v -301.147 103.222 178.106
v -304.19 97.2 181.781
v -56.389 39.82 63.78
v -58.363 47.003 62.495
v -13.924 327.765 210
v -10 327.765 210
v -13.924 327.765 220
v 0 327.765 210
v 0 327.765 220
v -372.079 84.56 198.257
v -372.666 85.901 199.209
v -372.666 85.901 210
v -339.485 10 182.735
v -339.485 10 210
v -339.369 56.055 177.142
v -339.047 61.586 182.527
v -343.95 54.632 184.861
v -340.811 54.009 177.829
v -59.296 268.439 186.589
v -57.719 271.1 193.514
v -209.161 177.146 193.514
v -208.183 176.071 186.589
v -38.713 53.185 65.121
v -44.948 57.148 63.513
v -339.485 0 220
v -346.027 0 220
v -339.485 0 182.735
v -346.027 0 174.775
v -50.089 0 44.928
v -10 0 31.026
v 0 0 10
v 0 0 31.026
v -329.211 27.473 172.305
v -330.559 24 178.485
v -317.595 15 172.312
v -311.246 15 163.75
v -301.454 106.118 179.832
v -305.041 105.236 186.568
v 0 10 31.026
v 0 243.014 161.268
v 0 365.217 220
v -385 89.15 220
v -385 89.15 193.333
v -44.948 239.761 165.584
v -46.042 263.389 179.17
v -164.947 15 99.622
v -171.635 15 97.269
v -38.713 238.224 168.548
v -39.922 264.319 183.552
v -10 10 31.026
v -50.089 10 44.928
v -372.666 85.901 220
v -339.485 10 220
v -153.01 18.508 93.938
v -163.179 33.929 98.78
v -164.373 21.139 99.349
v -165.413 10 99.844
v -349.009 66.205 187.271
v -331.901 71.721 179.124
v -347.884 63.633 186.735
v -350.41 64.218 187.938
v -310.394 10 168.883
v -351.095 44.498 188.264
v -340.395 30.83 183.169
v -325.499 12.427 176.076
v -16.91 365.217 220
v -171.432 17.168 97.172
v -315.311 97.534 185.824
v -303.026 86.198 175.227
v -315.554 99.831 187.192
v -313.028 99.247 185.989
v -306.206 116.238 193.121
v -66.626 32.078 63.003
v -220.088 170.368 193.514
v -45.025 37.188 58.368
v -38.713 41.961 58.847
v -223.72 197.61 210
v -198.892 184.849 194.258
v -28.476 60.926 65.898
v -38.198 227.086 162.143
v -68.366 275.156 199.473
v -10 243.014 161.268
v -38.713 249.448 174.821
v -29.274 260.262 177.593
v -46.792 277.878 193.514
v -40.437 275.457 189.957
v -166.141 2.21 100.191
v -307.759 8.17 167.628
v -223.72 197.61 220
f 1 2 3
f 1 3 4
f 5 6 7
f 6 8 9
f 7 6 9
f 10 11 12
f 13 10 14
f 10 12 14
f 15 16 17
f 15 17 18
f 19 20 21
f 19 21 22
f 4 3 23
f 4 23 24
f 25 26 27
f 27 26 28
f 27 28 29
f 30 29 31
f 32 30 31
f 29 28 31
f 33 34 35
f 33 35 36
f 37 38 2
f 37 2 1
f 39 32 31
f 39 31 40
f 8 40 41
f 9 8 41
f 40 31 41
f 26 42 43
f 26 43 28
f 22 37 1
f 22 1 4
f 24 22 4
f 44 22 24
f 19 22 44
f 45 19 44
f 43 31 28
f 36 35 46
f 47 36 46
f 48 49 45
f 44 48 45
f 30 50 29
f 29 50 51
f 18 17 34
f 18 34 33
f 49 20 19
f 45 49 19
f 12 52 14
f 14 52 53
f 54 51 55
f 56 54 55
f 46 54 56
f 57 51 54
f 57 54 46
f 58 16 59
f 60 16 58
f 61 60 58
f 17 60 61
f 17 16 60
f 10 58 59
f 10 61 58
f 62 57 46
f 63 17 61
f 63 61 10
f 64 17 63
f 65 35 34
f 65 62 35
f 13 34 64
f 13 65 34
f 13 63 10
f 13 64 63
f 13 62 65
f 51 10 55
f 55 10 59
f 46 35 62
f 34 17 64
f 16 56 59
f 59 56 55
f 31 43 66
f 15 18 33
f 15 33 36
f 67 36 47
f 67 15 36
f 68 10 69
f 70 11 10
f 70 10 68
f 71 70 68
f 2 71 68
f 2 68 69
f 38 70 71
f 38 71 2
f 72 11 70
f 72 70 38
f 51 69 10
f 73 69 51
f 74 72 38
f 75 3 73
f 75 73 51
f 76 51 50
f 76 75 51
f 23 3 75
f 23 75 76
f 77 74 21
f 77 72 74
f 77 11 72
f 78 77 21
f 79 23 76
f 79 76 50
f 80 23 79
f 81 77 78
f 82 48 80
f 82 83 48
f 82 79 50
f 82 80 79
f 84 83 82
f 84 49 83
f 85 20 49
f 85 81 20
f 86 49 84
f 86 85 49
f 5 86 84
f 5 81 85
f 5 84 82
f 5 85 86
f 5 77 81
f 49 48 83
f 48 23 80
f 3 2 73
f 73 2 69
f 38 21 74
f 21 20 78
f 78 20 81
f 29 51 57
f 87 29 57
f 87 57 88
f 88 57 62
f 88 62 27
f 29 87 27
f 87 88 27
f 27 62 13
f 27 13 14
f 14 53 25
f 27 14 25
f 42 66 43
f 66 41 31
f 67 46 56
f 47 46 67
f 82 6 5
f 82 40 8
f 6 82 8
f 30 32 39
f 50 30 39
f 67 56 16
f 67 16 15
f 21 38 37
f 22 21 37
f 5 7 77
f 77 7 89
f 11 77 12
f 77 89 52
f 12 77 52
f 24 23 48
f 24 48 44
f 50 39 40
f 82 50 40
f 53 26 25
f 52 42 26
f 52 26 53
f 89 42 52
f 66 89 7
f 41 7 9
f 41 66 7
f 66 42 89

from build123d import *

# Parameters (mm, degrees)
BOSS_EXTRU_1_DEPTH       = 220
ENL_V_MAT_EXTRU_1_DEPTH  = 593.628391152
ENL_V_MAT_EXTRU_7_DEPTH  = 585.622735541
ENL_V_MAT_EXTRU_8_DEPTH  = 581.933509888
ENL_V_MAT_EXTRU_9_DEPTH  = 576.952076714
COQUE2_T                 = 10
ENL_V_MAT_EXTRU_10_DEPTH = 10
ENL_V_MAT_EXTRU_11_DEPTH = 10
ENL_V_MAT_EXTRU_12_DEPTH = 10
ENL_V_MAT_EXTRU_13_DEPTH = 5
ENL_V_MAT_EXTRU_14_DEPTH = 5
CHANFREIN1_SIZE          = 5


with BuildPart() as part:
    # Esquisse1 → Boss.-Extru.1 (new body)
    with BuildSketch(Plane.XY):
        Polygon((0, 0), (0, 300), (0, 377.9), (-400, 77.9), (-400, 0), align=None)
    extrude(amount=BOSS_EXTRU_1_DEPTH)

    # Esquisse2 → Enlèv. mat.-Extru.1 (cut, through all)
    with BuildSketch(Plane(origin=(0, 0, 0), x_dir=(0, 0, -1), z_dir=(1, 0, 0))):
        Polygon((-240, 400), (-10, 0), (0, 0), (0, 377.9), (0, 400), align=None)
    extrude(amount=-ENL_V_MAT_EXTRU_1_DEPTH, mode=Mode.SUBTRACT)

    # Esquisse9 → Enlèv. mat.-Extru.7 (cut, through all)
    with BuildSketch(Plane(origin=(0, 0, 0), x_dir=(-1, 0, 0), z_dir=(0, -1, 0))):
        Polygon((0, -10), (546, -270), (546, -10), align=None)
    extrude(amount=-ENL_V_MAT_EXTRU_7_DEPTH, mode=Mode.SUBTRACT)

    # Esquisse10 → Enlèv. mat.-Extru.8 (cut, through all)
    with BuildSketch(Plane.XY.offset(220)):
        Polygon((-400, 77.9), (-385, 89.15), (15, -825.85), (-400, -825.85), align=None)
    extrude(amount=-ENL_V_MAT_EXTRU_8_DEPTH, mode=Mode.SUBTRACT)

    # Esquisse11 → Enlèv. mat.-Extru.9 (cut, through all)
    with BuildSketch(Plane(origin=(2.420403375, -3.901436921, 6.980009459), x_dir=(-0.957115229324862, -0.14134879209424664, 0.25288526403868283), z_dir=(-0.2897075038628045, 0.46697817542256076, -0.8354645090514613))):
        Polygon((411.522876563, 185.157287383), (386.822778124, 107.338380422), (375.386020672, 85.272983458), (2.52885264, 4.879017292), (4.011720976, 426.13611676), (20.196678216, 426.13611676), align=None)
    extrude(amount=ENL_V_MAT_EXTRU_9_DEPTH, mode=Mode.SUBTRACT)

    # Coque2 (no face opened: a closed hollow body)
    add(offset(amount=-COQUE2_T, mode=Mode.PRIVATE), mode=Mode.SUBTRACT)

    # Esquisse12 → Enlèv. mat.-Extru.10 (cut)
    with BuildSketch(Plane(origin=(0, 0, 0), x_dir=(0, 0, -1), z_dir=(1, 0, 0))):
        Polygon((-220, 0), (-31.026454867, 0), (-31.026454867, 10), (-161.268107242, 243.013626517), (-210, 327.764744356), (-220, 327.764744356), align=None)
    extrude(amount=-ENL_V_MAT_EXTRU_10_DEPTH, mode=Mode.SUBTRACT)

    # Esquisse13 → Enlèv. mat.-Extru.11 (cut)
    with BuildSketch(Plane.XY.offset(220)):
        Polygon((-10, 327.764744356), (-13.924111282, 327.764744356), (-223.720300682, 197.609774488), (-372.665748674, 85.900688494), (-339.485119824, 10), (-339.485119824, 0), (0, 0), (0, 327.764744356), align=None)
    extrude(amount=-ENL_V_MAT_EXTRU_11_DEPTH, mode=Mode.SUBTRACT)

    # Esquisse14 → Enlèv. mat.-Extru.12 (cut)
    with BuildSketch(Plane(origin=(0, 10, 0), x_dir=(1, 0, 0), z_dir=(0, 1, 0))):
        Polygon((-10, -31.026454867), (-50.088935394, -44.927781949), (-339.485119824, -182.735488821), (-339.485119824, -210), (-10, -210), align=None)
    extrude(amount=-ENL_V_MAT_EXTRU_12_DEPTH, mode=Mode.SUBTRACT)

    # Esquisse15 → Enlèv. mat.-Extru.13 (cut)
    with BuildSketch(Plane(origin=(5.317478413, -8.571218675, 15.334654549), x_dir=(0.957115229324862, 0.14134879209424633, -0.25288526403868294), z_dir=(0.2897075038628044, -0.4669781754225606, 0.8354645090514614))):
        Polygon((-47.266156251, 320.279040761), (-65.860823636, 331.058022207), (-224.088873852, 249.046543535), (-324.264873355, 182.887396388), (-323.375809314, 173.536914552), (-64.470820642, 65.876603428), (-46.003797604, 78.19747196), (-46.003797604, 290.180399582), align=None)
    extrude(amount=-ENL_V_MAT_EXTRU_13_DEPTH, mode=Mode.SUBTRACT)

    # Esquisse16 → Enlèv. mat.-Extru.14 (cut)
    with BuildSketch(Plane(origin=(8.181036358, 0, 17.180176353), x_dir=(0.9028605188239304, 0, -0.4299335803923476), z_dir=(0.4299335803923476, 0, 0.9028605188239304))):
        Polygon((-191.754542227, 15), (-191.119657804, 21.139217145), (-384.586204292, 61.586295788), (-390.01662066, 54.63224463), (-375.184932722, 24.000456874), (-360.826977231, 15), align=None)
    extrude(amount=-ENL_V_MAT_EXTRU_14_DEPTH, mode=Mode.SUBTRACT)

    # Chanfrein1
    # the kernel refuses this chamfer: 5 mm, written as the material it adds along each edge
    with BuildSketch(Plane(origin=(-40.161994399, 44.295460011, 54.670053412), x_dir=(0.3159146926025526, -0.462915109925161, 0.8281953320327342), z_dir=(0, 0.8728985637819059, 0.48790172919091623))) as chanfrein1_piece_1_section:
        Polygon((CHANFREIN1_SIZE * 0.999621916911, -CHANFREIN1_SIZE * 0.0274958766106), (-CHANFREIN1_SIZE * 0.0274958766106, -CHANFREIN1_SIZE * 0.999621916911), (0, 0), align=None)
    chanfrein1_piece_1 = extrude(amount=237.699757502, mode=Mode.PRIVATE)
    chanfrein1_piece_1 = split(chanfrein1_piece_1, bisect_by=Plane(origin=(-40.208550671, 46.8969516, 62.124981095), z_dir=(-0.2897075038628046, 0.46697817542256076, -0.8354645090514613)), keep=Keep.TOP, mode=Mode.PRIVATE)
    add(chanfrein1_piece_1)
    with BuildSketch(Plane(origin=(-68.07465725, 34.413144895, 58.825445246), x_dir=(0.30420367327836906, -0.4846099980151233, 0.8201300354137321), z_dir=(0.7961785265635489, 0.602037439248781, 0.060420820764590655))) as chanfrein1_piece_2_section:
        Polygon((CHANFREIN1_SIZE * 0.999621916911, -CHANFREIN1_SIZE * 0.0274958766106), (-CHANFREIN1_SIZE * 0.0274958766106, -CHANFREIN1_SIZE * 0.999621916911), (0, 0), align=None)
    chanfrein1_piece_2 = extrude(amount=47.916711439, mode=Mode.PRIVATE)
    chanfrein1_piece_2 = split(chanfrein1_piece_2, bisect_by=Plane(origin=(-62.751981741, 36.64687929, 64.212970543), z_dir=(-0.2897075038628046, 0.46697817542256076, -0.8354645090514613)), keep=Keep.TOP, mode=Mode.PRIVATE)
    add(chanfrein1_piece_2)
    with BuildSketch(Plane(origin=(-317.002639554, 102.166369021, 183.014540357), x_dir=(0.27949349185715106, -0.4904553232059303, 0.8254313805207935), z_dir=(0.8837534495057562, -0.20464057148945075, -0.42083497595512176))) as chanfrein1_piece_3_section:
        Polygon((CHANFREIN1_SIZE * 0.999621916911, -CHANFREIN1_SIZE * 0.0274958766106), (-CHANFREIN1_SIZE * 0.0274958766106, -CHANFREIN1_SIZE * 0.999621916911), (0, 0), align=None)
    chanfrein1_piece_3 = extrude(amount=306.113933558, mode=Mode.PRIVATE)
    chanfrein1_piece_3 = split(chanfrein1_piece_3, bisect_by=Plane(origin=(-309.662798292, 99.962525559, 185.222229721), z_dir=(-0.2897075038628046, 0.46697817542256076, -0.8354645090514613)), keep=Keep.TOP, mode=Mode.PRIVATE)
    add(chanfrein1_piece_3)
    with BuildSketch(Plane(origin=(-307.65482851, 118.573028738, 188.943482833), x_dir=(0.2633994072478335, -0.4729425091279115, 0.8408008892248422), z_dir=(0.09059598606414514, -0.8555999408705789, -0.5096480241218712))) as chanfrein1_piece_4_section:
        Polygon((CHANFREIN1_SIZE * 0.999621916911, -CHANFREIN1_SIZE * 0.0274958766106), (-CHANFREIN1_SIZE * 0.0274958766106, -CHANFREIN1_SIZE * 0.999621916911), (0, 0), align=None)
    chanfrein1_piece_4 = extrude(amount=35.10948368, mode=Mode.PRIVATE)
    chanfrein1_piece_4 = split(chanfrein1_piece_4, bisect_by=Plane(origin=(-304.154916551, 111.450481176, 189.733432581), z_dir=(-0.2897075038628046, 0.46697817542256076, -0.8354645090514613)), keep=Keep.TOP, mode=Mode.PRIVATE)
    add(chanfrein1_piece_4)
    with BuildSketch(Plane(origin=(-200.340434194, 187.183474827, 190.080330196), x_dir=(0.27509504551843234, -0.44891584015791836, 0.8501748551836392), z_dir=(-0.7986597762217562, -0.5989948321663171, -0.05785976912726176))) as chanfrein1_piece_5_section:
        Polygon((CHANFREIN1_SIZE * 0.999621916911, -CHANFREIN1_SIZE * 0.0274958766106), (-CHANFREIN1_SIZE * 0.0274958766106, -CHANFREIN1_SIZE * 0.999621916911), (0, 0), align=None)
    chanfrein1_piece_5 = extrude(amount=145.767917453, mode=Mode.PRIVATE)
    chanfrein1_piece_5 = split(chanfrein1_piece_5, bisect_by=Plane(origin=(-202.533814806, 181.753905632, 193.790779261), z_dir=(-0.2897075038628046, 0.46697817542256076, -0.8354645090514613)), keep=Keep.TOP, mode=Mode.PRIVATE)
    add(chanfrein1_piece_5)
    with BuildSketch(Plane(origin=(-48.240952428, 280.213064842, 189.336345276), x_dir=(0.2774877365282881, -0.4472811894008833, 0.8502588392275253), z_dir=(-0.8497551250873772, -0.5271776051652194, 0))) as chanfrein1_piece_6_section:
        Polygon((CHANFREIN1_SIZE * 0.999621916911, -CHANFREIN1_SIZE * 0.0274958766106), (-CHANFREIN1_SIZE * 0.0274958766106, -CHANFREIN1_SIZE * 0.999621916911), (0, 0), align=None)
    chanfrein1_piece_6 = extrude(amount=203.93579214, mode=Mode.PRIVATE)
    chanfrein1_piece_6 = split(chanfrein1_piece_6, bisect_by=Plane(origin=(-51.141678834, 273.639790239, 192.652807431), z_dir=(-0.2897075038628046, 0.46697817542256076, -0.8354645090514613)), keep=Keep.TOP, mode=Mode.PRIVATE)
    add(chanfrein1_piece_6)
    with BuildSketch(Plane(origin=(-30.722819132, 262.597188686, 173.415424362), x_dir=(0.30279611641961773, -0.4440879078496585, 0.8432677166730093), z_dir=(-0.8280490249451176, 0.31548088408434294, 0.46347235523254393))) as chanfrein1_piece_7_section:
        Polygon((CHANFREIN1_SIZE * 0.999621916911, -CHANFREIN1_SIZE * 0.0274958766106), (-CHANFREIN1_SIZE * 0.0274958766106, -CHANFREIN1_SIZE * 0.999621916911), (0, 0), align=None)
    chanfrein1_piece_7 = extrude(amount=47.209807713, mode=Mode.PRIVATE)
    chanfrein1_piece_7 = split(chanfrein1_piece_7, bisect_by=Plane(origin=(-34.936696237, 260.839111264, 179.878664837), z_dir=(-0.2897075038628046, 0.46697817542256076, -0.8354645090514613)), keep=Keep.TOP, mode=Mode.PRIVATE)
    add(chanfrein1_piece_7)
    with BuildSketch(Plane(origin=(-39.646283985, 229.421072997, 157.966141832), x_dir=(0.31589157722178685, -0.46191278396742486, 0.8287635920139076), z_dir=(-0.04010684179965448, 0.8662087875824183, 0.498070052859891))) as chanfrein1_piece_8_section:
        Polygon((CHANFREIN1_SIZE * 0.999621916911, -CHANFREIN1_SIZE * 0.0274958766106), (-CHANFREIN1_SIZE * 0.0274958766106, -CHANFREIN1_SIZE * 0.999621916911), (0, 0), align=None)
    chanfrein1_piece_8 = extrude(amount=55.841931543, mode=Mode.PRIVATE)
    chanfrein1_piece_8 = split(chanfrein1_piece_8, bisect_by=Plane(origin=(-38.499704125, 231.686313872, 164.819389576), z_dir=(-0.2897075038628046, 0.46697817542256076, -0.8354645090514613)), keep=Keep.TOP, mode=Mode.PRIVATE)
    add(chanfrein1_piece_8)
    with BuildSketch(Plane(origin=(-342.544767506, 30.829984913, 178.654509931), x_dir=(0.41658568505778765, -0.023296939600526662, 0.9087978981105664), z_dir=(0.7649833199588183, -0.5311329639949918, -0.36427777140896095))) as chanfrein1_piece_9_section:
        Polygon((CHANFREIN1_SIZE * 0.999621916911, -CHANFREIN1_SIZE * 0.0274958766106), (-CHANFREIN1_SIZE * 0.0274958766106, -CHANFREIN1_SIZE * 0.999621916911), (0, 0), align=None)
    chanfrein1_piece_9 = extrude(amount=42.662599553, mode=Mode.PRIVATE)
    chanfrein1_piece_9 = split(chanfrein1_piece_9, bisect_by=Plane(origin=(-335.660362509, 29.200535476, 180.914175814), z_dir=(-0.42993358039234775, 0, -0.9028605188239304)), keep=Keep.TOP, mode=Mode.PRIVATE)
    add(chanfrein1_piece_9)
    with BuildSketch(Plane(origin=(-351.15854534, 66.205405543, 182.7563089), x_dir=(0.40742744830986827, -0.011982580645932633, 0.9131589632286229), z_dir=(0.3934625955758405, -0.9000456873797399, -0.18736314075040017))) as chanfrein1_piece_10_section:
        Polygon((CHANFREIN1_SIZE * 0.999621916911, -CHANFREIN1_SIZE * 0.0274958766106), (-CHANFREIN1_SIZE * 0.0274958766106, -CHANFREIN1_SIZE * 0.999621916911), (0, 0), align=None)
    chanfrein1_piece_10 = extrude(amount=59.750421935, mode=Mode.PRIVATE)
    chanfrein1_piece_10 = split(chanfrein1_piece_10, bisect_by=Plane(origin=(-345.34283002, 61.461742689, 185.524874628), z_dir=(-0.42993358039234775, 0, -0.9028605188239304)), keep=Keep.TOP, mode=Mode.PRIVATE)
    add(chanfrein1_piece_10)
    with BuildSketch(Plane(origin=(-334.051091784, 71.720762303, 174.609902444), x_dir=(0.41020504604213787, 0.01692295790963476, 0.911836297641828), z_dir=(-0.5556858860955991, -0.7881583042423078, 0.2646123267121899))) as chanfrein1_piece_11_section:
        Polygon((CHANFREIN1_SIZE * 0.999621916911, -CHANFREIN1_SIZE * 0.0274958766106), (-CHANFREIN1_SIZE * 0.0274958766106, -CHANFREIN1_SIZE * 0.999621916911), (0, 0), align=None)
    chanfrein1_piece_11 = extrude(amount=34.53999538, mode=Mode.PRIVATE)
    chanfrein1_piece_11 = split(chanfrein1_piece_11, bisect_by=Plane(origin=(-334.127686144, 65.984062058, 180.184329926), z_dir=(-0.42993358039234775, 0, -0.9028605188239304)), keep=Keep.TOP, mode=Mode.PRIVATE)
    add(chanfrein1_piece_11)
    with BuildSketch(Plane(origin=(-155.159356387, 18.507863763, 89.423361779), x_dir=(0.43485121997615706, 0.02691398648535738, 0.900100024339914), z_dir=(-0.8837534495057563, 0.20464057148945047, 0.42083497595512187))) as chanfrein1_piece_12_section:
        Polygon((CHANFREIN1_SIZE * 0.999621916911, -CHANFREIN1_SIZE * 0.0274958766106), (-CHANFREIN1_SIZE * 0.0274958766106, -CHANFREIN1_SIZE * 0.999621916911), (0, 0), align=None)
    chanfrein1_piece_12 = extrude(amount=223.366193099, mode=Mode.PRIVATE)
    chanfrein1_piece_12 = split(chanfrein1_piece_12, bisect_by=Plane(origin=(-158.919465377, 18.201780851, 96.751843846), z_dir=(-0.42993358039234775, 0, -0.9028605188239304)), keep=Keep.TOP, mode=Mode.PRIVATE)
    add(chanfrein1_piece_12)
    with BuildSketch(Plane(origin=(-168.290444566, 2.209796043, 95.676260912), x_dir=(0.45446428049870663, -0.002828389920449722, 0.8907604717101286), z_dir=(0.09287361982234821, 0.9946952261622446, -0.04422553324873722))) as chanfrein1_piece_13_section:
        Polygon((CHANFREIN1_SIZE * 0.999621916911, -CHANFREIN1_SIZE * 0.0274958766106), (-CHANFREIN1_SIZE * 0.0274958766106, -CHANFREIN1_SIZE * 0.999621916911), (0, 0), align=None)
    chanfrein1_piece_13 = extrude(amount=31.888787866, mode=Mode.PRIVATE)
    chanfrein1_piece_13 = split(chanfrein1_piece_13, bisect_by=Plane(origin=(-167.023575776, 8.689202011, 100.610944036), z_dir=(-0.42993358039234775, 0, -0.9028605188239304)), keep=Keep.TOP, mode=Mode.PRIVATE)
    add(chanfrein1_piece_13)


solid = part.part
